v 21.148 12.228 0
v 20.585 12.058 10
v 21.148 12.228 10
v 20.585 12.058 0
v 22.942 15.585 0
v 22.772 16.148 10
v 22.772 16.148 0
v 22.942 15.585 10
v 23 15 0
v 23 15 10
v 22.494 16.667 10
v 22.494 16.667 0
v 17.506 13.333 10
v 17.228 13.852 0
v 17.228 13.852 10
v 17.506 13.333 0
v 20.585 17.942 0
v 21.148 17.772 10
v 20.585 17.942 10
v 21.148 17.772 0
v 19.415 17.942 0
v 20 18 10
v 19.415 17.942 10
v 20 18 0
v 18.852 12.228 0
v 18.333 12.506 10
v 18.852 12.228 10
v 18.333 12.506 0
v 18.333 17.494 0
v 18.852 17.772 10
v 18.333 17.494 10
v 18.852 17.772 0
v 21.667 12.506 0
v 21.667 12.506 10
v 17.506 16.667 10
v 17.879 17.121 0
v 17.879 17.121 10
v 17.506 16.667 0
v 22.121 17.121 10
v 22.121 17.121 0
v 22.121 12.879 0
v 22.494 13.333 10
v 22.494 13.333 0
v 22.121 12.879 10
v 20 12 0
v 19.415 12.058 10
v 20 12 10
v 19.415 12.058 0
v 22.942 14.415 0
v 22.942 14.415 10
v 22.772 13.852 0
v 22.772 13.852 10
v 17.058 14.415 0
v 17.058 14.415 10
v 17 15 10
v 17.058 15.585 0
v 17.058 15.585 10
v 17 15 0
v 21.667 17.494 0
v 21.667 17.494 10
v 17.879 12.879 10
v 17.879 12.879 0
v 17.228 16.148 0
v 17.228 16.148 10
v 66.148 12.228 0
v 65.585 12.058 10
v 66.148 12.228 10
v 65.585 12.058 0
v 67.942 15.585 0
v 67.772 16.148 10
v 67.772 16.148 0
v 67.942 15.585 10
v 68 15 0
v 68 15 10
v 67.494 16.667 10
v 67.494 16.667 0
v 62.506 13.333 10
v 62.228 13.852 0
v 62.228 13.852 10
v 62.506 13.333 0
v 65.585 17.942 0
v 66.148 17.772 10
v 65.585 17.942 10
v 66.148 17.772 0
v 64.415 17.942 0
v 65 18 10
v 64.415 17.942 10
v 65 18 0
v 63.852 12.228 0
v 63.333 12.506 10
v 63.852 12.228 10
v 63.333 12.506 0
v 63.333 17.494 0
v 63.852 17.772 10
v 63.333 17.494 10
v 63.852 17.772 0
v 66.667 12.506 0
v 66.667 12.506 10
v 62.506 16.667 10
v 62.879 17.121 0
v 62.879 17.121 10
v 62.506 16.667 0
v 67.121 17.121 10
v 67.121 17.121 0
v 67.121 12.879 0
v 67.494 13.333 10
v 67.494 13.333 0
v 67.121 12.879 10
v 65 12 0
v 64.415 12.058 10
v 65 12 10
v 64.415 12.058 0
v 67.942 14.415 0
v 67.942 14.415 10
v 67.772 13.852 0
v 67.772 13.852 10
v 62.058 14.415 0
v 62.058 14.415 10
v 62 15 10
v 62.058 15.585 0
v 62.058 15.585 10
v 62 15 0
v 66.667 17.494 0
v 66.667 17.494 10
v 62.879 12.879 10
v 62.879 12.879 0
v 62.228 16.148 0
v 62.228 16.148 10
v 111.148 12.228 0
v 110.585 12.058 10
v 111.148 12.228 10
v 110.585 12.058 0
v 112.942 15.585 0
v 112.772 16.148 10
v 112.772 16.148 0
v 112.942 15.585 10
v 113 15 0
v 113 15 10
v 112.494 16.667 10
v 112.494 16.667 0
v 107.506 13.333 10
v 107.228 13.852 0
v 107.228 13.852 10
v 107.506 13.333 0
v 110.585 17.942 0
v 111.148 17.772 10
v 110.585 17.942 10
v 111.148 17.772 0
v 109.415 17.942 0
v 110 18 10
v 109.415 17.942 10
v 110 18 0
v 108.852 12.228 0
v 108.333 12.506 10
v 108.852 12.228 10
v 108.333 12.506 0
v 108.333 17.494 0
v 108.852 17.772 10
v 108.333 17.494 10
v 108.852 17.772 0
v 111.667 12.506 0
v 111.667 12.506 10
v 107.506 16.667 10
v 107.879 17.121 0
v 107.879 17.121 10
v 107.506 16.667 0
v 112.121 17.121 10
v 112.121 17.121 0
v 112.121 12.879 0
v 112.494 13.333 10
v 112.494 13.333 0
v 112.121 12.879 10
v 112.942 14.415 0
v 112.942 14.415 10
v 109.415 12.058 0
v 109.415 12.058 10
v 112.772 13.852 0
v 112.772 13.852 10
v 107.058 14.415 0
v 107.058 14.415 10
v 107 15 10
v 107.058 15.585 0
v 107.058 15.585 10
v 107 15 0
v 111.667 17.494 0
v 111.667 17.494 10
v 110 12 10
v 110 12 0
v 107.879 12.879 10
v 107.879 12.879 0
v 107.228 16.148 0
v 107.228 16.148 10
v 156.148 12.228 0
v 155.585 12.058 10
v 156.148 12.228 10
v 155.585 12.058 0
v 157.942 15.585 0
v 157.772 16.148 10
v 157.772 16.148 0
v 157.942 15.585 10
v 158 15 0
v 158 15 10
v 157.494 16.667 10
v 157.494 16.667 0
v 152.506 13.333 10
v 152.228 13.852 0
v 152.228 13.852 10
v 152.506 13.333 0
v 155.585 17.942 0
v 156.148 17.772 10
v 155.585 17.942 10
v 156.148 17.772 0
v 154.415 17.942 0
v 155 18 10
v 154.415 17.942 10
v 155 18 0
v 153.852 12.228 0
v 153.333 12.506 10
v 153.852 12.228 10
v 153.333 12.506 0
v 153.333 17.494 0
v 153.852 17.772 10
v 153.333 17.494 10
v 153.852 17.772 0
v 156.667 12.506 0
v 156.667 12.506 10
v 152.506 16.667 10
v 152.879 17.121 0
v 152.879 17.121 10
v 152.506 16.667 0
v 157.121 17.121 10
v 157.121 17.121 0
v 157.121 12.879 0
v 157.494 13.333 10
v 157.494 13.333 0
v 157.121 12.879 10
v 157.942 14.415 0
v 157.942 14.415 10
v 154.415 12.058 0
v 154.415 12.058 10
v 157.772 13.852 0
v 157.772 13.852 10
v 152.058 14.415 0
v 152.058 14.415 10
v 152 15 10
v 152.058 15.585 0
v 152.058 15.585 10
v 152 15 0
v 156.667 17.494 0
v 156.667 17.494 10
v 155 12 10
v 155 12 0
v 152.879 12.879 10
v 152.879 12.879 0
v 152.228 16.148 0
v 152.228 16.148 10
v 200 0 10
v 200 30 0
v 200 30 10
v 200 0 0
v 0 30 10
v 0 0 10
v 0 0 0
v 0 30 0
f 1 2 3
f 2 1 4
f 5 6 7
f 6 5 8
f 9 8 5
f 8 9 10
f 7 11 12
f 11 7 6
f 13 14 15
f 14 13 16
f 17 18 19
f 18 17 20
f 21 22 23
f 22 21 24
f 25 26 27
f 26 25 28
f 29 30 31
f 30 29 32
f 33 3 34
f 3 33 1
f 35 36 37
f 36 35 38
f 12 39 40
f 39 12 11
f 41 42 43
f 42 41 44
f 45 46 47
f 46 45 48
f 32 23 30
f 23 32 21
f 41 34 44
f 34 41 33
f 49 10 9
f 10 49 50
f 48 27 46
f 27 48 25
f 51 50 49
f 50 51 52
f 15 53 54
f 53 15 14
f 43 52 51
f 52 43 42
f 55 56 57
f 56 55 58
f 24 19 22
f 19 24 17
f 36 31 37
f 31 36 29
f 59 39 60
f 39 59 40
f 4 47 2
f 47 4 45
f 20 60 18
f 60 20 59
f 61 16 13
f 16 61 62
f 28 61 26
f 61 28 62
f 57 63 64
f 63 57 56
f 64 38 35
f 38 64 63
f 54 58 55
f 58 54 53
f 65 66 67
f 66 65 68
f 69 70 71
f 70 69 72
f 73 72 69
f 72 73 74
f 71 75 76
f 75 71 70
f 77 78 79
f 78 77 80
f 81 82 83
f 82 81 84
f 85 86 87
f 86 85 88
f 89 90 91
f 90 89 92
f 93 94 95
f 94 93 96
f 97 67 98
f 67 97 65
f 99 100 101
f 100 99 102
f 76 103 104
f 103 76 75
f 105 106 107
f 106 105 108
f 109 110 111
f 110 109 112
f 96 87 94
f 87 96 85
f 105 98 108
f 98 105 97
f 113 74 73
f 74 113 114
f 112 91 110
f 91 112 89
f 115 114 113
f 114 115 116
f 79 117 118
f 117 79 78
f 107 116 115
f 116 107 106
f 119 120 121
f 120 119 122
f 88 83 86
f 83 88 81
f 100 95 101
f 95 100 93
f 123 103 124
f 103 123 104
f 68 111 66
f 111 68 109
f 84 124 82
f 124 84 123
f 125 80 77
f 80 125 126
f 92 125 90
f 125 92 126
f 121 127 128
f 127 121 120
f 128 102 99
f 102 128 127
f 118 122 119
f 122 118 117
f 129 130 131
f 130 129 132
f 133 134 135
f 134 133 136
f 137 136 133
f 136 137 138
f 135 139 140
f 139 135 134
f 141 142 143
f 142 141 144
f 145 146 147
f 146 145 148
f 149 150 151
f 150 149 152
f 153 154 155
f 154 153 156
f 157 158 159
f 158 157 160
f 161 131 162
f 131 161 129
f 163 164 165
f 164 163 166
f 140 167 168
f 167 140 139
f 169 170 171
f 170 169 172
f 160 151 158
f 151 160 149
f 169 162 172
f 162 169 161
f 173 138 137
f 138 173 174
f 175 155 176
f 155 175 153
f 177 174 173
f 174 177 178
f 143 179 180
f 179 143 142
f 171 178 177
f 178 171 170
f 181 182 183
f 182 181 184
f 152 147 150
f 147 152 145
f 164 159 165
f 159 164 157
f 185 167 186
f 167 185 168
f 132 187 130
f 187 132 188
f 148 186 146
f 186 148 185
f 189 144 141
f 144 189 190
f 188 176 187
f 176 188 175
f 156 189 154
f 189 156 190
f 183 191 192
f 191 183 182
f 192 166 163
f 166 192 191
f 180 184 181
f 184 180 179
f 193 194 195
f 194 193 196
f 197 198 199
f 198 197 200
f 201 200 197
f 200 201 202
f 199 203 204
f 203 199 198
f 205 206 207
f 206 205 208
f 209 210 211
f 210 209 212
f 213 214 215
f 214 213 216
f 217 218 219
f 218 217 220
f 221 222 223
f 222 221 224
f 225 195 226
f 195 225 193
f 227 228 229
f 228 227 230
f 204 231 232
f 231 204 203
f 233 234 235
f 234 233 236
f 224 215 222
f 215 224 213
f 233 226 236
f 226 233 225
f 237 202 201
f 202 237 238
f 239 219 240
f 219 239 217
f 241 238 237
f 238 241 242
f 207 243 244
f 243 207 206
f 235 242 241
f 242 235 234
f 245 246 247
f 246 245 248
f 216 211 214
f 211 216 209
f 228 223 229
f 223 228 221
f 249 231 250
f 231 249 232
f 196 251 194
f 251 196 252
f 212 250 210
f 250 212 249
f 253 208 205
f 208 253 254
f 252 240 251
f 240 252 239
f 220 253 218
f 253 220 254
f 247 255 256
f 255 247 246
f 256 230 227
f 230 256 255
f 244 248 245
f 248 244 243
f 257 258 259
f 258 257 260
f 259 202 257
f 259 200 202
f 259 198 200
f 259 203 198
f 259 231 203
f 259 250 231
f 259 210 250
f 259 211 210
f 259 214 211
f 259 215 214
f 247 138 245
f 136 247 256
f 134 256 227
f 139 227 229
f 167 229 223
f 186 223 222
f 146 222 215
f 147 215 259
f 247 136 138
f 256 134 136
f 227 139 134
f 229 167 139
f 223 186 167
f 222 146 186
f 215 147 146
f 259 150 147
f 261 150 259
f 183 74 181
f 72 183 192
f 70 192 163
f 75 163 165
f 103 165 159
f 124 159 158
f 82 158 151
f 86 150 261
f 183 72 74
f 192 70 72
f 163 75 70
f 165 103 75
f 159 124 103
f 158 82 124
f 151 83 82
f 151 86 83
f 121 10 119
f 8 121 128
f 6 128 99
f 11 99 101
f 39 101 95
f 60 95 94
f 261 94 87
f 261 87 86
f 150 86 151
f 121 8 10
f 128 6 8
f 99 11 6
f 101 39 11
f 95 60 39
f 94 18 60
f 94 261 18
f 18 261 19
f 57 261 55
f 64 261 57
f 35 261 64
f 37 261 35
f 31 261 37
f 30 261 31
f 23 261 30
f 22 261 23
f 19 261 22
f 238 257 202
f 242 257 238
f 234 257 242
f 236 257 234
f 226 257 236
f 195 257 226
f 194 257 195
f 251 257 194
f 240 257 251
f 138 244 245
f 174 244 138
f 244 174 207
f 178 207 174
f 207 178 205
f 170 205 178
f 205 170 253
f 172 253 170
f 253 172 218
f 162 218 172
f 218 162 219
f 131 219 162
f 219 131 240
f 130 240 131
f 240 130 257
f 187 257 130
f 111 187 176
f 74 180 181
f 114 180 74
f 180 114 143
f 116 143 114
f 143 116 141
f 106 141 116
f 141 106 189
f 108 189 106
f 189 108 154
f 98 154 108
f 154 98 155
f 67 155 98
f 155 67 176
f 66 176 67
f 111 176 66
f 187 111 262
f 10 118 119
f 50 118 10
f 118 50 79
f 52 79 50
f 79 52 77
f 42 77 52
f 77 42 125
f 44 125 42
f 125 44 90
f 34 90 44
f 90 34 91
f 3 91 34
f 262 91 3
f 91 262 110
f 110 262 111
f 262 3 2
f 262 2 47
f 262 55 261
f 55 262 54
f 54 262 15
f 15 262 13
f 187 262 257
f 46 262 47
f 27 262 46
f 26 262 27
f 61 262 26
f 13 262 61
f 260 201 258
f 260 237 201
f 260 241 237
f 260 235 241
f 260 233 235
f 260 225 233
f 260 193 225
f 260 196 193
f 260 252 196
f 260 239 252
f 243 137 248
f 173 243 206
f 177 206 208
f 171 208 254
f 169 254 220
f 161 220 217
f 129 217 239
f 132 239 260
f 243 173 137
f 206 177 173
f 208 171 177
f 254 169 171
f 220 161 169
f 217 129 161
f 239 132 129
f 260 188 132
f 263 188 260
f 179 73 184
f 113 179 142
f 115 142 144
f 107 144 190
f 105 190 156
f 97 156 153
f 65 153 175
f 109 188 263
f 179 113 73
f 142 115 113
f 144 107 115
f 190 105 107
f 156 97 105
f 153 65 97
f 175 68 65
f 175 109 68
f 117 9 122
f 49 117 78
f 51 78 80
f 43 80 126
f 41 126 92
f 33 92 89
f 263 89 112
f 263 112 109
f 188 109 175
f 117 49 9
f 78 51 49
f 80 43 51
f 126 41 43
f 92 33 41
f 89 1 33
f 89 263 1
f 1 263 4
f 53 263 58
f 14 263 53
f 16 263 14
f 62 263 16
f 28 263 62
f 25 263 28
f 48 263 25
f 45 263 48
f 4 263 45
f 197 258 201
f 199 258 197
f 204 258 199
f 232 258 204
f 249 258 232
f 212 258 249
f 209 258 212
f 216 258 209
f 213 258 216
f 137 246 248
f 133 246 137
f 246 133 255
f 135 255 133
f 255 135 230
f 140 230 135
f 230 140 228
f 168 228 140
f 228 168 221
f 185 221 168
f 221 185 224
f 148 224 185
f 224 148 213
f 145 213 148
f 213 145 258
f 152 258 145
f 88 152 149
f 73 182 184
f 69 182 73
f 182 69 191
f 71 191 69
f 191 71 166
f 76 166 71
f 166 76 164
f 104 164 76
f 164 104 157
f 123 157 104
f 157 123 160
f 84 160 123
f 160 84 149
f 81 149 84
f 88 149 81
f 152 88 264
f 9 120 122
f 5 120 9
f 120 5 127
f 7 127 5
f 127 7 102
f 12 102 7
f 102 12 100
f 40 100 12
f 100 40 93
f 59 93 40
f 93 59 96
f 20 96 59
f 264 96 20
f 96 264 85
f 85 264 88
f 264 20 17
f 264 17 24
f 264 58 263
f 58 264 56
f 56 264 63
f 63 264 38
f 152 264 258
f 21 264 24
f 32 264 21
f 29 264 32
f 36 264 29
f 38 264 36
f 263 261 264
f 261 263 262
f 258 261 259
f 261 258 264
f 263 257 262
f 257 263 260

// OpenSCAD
$fn = 32;

// ----------------------------------------------------------------------
// Long rail: 200-250 mm mounting rail
// ----------------------------------------------------------------------

// --- parameters (mm) ---
rail_l = 200;             // rail length, X
rail_w = 30;              // rail width, Y
rail_t = 10;              // rail thickness, Z
hole_d = 6;               // mounting hole diameter
hole_start = 20;          // first hole offset from the end
hole_pitch = 45;          // hole pitch
holes = 4;                // number of holes

difference() {
  cube([rail_l, rail_w, rail_t]);
  for (i = [0 : holes - 1])
    translate([hole_start + i * hole_pitch, rail_w / 2, -1])
      cylinder(h = rail_t + 2, d = hole_d);
}
